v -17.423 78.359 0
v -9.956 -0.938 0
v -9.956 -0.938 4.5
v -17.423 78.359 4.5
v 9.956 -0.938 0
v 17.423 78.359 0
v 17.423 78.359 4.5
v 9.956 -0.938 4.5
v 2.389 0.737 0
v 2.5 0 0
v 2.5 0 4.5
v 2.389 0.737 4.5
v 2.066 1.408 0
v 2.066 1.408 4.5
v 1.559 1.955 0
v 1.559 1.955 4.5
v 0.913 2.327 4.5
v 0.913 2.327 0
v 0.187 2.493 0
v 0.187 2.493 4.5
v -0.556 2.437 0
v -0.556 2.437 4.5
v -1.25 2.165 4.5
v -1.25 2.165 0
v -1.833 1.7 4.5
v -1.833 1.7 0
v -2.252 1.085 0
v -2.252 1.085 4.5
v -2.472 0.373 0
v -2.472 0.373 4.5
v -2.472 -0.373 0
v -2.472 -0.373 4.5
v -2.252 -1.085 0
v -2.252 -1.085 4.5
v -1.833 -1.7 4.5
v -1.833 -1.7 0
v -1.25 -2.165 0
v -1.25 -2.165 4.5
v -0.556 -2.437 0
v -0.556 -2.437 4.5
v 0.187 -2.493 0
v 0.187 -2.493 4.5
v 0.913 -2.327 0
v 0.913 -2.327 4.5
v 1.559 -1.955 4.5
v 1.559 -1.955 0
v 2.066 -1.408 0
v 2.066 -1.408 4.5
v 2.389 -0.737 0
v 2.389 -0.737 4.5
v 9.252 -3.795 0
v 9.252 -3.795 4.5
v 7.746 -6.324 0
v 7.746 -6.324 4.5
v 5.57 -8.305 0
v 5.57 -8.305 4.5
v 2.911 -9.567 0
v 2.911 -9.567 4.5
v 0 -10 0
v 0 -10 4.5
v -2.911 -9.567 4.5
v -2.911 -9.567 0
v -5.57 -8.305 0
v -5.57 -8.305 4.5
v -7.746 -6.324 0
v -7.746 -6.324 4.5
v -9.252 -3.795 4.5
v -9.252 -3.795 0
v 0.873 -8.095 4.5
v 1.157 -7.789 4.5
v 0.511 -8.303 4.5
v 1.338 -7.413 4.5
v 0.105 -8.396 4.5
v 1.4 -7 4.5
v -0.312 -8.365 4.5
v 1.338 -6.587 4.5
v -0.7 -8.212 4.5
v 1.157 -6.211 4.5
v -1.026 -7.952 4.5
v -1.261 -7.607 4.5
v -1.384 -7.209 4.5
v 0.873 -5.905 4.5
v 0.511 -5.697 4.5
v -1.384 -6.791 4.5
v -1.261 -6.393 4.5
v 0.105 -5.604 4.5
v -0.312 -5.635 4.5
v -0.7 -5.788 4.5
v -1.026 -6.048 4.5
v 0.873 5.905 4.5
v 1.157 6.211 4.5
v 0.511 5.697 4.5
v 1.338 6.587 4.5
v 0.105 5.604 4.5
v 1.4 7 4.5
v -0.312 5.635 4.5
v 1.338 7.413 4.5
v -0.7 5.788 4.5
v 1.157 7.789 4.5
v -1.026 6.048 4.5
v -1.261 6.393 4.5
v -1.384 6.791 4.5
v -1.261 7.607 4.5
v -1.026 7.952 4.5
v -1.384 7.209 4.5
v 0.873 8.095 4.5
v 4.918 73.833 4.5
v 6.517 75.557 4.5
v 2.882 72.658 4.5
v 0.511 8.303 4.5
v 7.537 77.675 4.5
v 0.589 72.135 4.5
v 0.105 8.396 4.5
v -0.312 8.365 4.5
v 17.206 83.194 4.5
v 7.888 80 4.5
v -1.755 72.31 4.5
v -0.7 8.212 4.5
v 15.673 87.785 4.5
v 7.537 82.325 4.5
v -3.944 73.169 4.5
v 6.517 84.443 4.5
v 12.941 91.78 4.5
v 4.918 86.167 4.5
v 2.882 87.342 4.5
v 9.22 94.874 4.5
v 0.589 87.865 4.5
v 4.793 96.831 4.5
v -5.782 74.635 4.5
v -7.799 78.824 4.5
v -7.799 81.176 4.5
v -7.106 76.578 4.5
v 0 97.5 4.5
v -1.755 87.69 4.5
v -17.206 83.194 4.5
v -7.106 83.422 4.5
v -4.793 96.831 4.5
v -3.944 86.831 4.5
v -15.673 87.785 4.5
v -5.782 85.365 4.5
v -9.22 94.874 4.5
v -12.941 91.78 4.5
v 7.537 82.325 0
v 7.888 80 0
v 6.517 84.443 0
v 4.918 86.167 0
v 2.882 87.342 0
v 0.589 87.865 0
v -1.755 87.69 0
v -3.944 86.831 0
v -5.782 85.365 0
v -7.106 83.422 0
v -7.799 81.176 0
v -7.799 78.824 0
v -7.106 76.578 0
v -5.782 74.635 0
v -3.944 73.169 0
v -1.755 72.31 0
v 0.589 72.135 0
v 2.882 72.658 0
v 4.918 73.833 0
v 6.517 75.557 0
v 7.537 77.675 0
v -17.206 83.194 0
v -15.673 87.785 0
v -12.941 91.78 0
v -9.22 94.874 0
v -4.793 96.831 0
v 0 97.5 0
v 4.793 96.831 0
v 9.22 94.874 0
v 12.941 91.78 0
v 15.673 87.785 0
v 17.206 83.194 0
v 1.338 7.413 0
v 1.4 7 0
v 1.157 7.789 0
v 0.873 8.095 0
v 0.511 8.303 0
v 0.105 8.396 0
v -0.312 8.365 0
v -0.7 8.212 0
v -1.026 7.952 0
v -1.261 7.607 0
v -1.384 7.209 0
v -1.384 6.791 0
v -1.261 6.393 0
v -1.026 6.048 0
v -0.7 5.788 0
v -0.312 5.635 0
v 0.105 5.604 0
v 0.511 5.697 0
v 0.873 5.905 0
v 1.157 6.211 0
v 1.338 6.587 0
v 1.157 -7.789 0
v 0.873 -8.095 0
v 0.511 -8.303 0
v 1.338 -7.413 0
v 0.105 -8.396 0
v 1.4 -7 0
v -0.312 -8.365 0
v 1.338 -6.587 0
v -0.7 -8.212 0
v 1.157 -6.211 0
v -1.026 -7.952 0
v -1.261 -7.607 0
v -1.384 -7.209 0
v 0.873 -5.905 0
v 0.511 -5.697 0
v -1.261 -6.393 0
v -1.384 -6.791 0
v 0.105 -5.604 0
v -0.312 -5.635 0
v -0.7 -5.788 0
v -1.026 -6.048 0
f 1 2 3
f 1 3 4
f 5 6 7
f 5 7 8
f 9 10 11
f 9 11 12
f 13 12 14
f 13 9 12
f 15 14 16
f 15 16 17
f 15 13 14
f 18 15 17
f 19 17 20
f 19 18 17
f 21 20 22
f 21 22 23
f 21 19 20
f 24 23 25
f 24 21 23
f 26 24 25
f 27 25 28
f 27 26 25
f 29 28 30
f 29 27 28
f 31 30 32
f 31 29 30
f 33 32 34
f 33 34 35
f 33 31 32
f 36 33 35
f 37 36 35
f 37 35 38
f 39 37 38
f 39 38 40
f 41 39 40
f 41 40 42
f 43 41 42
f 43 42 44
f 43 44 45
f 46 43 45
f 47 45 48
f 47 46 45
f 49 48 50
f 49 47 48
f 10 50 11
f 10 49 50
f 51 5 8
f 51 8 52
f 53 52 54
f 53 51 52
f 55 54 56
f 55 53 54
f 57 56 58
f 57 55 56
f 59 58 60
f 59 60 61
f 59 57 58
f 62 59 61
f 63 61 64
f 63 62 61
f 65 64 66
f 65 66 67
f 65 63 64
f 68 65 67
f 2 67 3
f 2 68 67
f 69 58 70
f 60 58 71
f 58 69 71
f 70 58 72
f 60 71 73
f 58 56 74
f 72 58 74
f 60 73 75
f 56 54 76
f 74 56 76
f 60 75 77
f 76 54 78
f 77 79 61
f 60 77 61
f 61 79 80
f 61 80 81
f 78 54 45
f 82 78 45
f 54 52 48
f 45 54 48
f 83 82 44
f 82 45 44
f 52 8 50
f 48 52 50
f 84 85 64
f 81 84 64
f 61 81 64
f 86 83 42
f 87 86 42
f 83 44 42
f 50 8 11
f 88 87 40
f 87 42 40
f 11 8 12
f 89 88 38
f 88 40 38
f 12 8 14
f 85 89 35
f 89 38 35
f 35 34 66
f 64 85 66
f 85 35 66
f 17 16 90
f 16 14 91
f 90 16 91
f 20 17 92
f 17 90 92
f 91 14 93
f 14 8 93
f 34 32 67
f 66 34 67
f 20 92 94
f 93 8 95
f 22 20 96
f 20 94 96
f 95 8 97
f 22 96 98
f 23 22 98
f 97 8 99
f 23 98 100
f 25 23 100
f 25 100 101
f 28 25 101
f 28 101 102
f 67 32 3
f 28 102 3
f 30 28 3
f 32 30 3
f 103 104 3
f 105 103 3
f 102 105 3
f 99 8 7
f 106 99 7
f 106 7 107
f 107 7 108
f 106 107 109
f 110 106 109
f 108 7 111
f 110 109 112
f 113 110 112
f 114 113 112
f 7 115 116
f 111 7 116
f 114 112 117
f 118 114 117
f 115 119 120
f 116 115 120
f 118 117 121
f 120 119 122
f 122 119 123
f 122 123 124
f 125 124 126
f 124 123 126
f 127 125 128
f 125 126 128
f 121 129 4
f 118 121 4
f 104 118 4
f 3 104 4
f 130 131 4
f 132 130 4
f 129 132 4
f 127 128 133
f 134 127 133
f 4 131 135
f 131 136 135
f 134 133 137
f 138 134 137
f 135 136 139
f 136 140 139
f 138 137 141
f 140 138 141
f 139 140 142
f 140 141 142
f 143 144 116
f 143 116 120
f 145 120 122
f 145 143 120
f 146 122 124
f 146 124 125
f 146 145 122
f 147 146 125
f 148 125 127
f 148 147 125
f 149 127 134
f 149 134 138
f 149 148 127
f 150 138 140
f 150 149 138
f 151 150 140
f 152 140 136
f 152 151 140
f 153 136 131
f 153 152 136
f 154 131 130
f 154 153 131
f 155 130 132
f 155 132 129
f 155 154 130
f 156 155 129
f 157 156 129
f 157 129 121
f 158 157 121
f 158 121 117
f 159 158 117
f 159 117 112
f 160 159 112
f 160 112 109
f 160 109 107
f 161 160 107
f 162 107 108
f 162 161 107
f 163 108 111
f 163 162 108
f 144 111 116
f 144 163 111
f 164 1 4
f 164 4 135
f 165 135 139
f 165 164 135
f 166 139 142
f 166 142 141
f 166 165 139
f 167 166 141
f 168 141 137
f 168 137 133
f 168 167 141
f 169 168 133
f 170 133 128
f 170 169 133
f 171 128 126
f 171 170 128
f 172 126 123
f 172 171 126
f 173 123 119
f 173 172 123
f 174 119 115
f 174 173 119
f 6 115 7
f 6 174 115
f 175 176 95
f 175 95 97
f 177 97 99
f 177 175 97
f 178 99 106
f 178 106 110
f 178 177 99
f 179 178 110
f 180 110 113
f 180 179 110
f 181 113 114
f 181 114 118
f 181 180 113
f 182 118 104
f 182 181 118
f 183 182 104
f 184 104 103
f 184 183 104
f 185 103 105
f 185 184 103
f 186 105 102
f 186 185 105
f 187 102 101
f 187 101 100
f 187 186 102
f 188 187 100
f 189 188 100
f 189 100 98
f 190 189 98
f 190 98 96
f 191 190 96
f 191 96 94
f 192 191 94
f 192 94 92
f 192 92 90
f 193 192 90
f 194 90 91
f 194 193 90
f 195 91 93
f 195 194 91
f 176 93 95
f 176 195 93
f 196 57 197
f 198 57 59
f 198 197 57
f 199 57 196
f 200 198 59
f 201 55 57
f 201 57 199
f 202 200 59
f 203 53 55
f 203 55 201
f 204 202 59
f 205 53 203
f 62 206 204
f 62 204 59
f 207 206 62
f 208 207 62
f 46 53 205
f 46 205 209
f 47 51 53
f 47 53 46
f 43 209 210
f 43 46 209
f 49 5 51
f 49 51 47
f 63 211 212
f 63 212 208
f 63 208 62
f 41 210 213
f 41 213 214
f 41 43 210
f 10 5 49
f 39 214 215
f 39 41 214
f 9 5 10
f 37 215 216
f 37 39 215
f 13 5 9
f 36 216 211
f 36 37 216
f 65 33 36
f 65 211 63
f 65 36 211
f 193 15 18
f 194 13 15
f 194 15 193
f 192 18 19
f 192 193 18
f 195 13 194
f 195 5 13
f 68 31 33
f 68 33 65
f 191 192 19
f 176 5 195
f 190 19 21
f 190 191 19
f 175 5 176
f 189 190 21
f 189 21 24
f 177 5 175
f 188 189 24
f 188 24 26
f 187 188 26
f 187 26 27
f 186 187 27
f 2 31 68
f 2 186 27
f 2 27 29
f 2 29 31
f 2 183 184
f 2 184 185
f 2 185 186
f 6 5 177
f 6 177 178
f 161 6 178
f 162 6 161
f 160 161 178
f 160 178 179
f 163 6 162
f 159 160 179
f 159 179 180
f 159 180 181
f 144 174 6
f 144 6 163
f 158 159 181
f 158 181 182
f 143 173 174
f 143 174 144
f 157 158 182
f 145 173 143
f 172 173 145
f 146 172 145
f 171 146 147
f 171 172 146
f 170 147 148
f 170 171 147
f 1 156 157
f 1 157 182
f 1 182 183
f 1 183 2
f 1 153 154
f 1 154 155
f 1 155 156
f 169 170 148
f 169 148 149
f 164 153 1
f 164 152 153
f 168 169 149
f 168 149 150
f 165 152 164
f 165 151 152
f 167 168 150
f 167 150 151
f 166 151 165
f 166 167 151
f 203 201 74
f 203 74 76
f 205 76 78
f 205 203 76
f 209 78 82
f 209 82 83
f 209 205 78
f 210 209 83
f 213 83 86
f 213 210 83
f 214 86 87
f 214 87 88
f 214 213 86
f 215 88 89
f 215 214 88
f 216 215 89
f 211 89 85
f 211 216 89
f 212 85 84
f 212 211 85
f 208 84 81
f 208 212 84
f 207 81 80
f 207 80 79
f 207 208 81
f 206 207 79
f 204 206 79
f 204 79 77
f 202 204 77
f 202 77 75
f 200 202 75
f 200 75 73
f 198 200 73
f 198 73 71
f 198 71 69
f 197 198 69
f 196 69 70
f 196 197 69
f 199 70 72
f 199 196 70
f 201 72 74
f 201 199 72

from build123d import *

# Parameters (mm, degrees)
SKETCH1_R           = 7.8875
SKETCH1_R_2         = 2.5
SKETCH1_R_3         = 1.4
BOSS_EXTRUDE1_DEPTH = 4.5


with BuildPart() as part:
    # Sketch1 → Boss-Extrude1 (new body)
    with BuildSketch(Plane.XY):
        with BuildLine():
            Line((-9.955957701, -0.9375), (-17.422925977, 78.359375))
            ThreePointArc((-17.422925977, 78.359375), (0, 97.5), (17.422925977, 78.359375))
            Line((17.422925977, 78.359375), (9.955957701, -0.9375))
            ThreePointArc((9.955957701, -0.9375), (0, -10), (-9.955957701, -0.9375))
        make_face()
        with Locations((0, 80)):
            Circle(SKETCH1_R, mode=Mode.SUBTRACT)
        Circle(SKETCH1_R_2, mode=Mode.SUBTRACT)
        with Locations((0, 7)):
            Circle(SKETCH1_R_3, mode=Mode.SUBTRACT)
        with Locations((0, -7)):
            Circle(SKETCH1_R_3, mode=Mode.SUBTRACT)
    extrude(amount=BOSS_EXTRUDE1_DEPTH)


solid = part.part
